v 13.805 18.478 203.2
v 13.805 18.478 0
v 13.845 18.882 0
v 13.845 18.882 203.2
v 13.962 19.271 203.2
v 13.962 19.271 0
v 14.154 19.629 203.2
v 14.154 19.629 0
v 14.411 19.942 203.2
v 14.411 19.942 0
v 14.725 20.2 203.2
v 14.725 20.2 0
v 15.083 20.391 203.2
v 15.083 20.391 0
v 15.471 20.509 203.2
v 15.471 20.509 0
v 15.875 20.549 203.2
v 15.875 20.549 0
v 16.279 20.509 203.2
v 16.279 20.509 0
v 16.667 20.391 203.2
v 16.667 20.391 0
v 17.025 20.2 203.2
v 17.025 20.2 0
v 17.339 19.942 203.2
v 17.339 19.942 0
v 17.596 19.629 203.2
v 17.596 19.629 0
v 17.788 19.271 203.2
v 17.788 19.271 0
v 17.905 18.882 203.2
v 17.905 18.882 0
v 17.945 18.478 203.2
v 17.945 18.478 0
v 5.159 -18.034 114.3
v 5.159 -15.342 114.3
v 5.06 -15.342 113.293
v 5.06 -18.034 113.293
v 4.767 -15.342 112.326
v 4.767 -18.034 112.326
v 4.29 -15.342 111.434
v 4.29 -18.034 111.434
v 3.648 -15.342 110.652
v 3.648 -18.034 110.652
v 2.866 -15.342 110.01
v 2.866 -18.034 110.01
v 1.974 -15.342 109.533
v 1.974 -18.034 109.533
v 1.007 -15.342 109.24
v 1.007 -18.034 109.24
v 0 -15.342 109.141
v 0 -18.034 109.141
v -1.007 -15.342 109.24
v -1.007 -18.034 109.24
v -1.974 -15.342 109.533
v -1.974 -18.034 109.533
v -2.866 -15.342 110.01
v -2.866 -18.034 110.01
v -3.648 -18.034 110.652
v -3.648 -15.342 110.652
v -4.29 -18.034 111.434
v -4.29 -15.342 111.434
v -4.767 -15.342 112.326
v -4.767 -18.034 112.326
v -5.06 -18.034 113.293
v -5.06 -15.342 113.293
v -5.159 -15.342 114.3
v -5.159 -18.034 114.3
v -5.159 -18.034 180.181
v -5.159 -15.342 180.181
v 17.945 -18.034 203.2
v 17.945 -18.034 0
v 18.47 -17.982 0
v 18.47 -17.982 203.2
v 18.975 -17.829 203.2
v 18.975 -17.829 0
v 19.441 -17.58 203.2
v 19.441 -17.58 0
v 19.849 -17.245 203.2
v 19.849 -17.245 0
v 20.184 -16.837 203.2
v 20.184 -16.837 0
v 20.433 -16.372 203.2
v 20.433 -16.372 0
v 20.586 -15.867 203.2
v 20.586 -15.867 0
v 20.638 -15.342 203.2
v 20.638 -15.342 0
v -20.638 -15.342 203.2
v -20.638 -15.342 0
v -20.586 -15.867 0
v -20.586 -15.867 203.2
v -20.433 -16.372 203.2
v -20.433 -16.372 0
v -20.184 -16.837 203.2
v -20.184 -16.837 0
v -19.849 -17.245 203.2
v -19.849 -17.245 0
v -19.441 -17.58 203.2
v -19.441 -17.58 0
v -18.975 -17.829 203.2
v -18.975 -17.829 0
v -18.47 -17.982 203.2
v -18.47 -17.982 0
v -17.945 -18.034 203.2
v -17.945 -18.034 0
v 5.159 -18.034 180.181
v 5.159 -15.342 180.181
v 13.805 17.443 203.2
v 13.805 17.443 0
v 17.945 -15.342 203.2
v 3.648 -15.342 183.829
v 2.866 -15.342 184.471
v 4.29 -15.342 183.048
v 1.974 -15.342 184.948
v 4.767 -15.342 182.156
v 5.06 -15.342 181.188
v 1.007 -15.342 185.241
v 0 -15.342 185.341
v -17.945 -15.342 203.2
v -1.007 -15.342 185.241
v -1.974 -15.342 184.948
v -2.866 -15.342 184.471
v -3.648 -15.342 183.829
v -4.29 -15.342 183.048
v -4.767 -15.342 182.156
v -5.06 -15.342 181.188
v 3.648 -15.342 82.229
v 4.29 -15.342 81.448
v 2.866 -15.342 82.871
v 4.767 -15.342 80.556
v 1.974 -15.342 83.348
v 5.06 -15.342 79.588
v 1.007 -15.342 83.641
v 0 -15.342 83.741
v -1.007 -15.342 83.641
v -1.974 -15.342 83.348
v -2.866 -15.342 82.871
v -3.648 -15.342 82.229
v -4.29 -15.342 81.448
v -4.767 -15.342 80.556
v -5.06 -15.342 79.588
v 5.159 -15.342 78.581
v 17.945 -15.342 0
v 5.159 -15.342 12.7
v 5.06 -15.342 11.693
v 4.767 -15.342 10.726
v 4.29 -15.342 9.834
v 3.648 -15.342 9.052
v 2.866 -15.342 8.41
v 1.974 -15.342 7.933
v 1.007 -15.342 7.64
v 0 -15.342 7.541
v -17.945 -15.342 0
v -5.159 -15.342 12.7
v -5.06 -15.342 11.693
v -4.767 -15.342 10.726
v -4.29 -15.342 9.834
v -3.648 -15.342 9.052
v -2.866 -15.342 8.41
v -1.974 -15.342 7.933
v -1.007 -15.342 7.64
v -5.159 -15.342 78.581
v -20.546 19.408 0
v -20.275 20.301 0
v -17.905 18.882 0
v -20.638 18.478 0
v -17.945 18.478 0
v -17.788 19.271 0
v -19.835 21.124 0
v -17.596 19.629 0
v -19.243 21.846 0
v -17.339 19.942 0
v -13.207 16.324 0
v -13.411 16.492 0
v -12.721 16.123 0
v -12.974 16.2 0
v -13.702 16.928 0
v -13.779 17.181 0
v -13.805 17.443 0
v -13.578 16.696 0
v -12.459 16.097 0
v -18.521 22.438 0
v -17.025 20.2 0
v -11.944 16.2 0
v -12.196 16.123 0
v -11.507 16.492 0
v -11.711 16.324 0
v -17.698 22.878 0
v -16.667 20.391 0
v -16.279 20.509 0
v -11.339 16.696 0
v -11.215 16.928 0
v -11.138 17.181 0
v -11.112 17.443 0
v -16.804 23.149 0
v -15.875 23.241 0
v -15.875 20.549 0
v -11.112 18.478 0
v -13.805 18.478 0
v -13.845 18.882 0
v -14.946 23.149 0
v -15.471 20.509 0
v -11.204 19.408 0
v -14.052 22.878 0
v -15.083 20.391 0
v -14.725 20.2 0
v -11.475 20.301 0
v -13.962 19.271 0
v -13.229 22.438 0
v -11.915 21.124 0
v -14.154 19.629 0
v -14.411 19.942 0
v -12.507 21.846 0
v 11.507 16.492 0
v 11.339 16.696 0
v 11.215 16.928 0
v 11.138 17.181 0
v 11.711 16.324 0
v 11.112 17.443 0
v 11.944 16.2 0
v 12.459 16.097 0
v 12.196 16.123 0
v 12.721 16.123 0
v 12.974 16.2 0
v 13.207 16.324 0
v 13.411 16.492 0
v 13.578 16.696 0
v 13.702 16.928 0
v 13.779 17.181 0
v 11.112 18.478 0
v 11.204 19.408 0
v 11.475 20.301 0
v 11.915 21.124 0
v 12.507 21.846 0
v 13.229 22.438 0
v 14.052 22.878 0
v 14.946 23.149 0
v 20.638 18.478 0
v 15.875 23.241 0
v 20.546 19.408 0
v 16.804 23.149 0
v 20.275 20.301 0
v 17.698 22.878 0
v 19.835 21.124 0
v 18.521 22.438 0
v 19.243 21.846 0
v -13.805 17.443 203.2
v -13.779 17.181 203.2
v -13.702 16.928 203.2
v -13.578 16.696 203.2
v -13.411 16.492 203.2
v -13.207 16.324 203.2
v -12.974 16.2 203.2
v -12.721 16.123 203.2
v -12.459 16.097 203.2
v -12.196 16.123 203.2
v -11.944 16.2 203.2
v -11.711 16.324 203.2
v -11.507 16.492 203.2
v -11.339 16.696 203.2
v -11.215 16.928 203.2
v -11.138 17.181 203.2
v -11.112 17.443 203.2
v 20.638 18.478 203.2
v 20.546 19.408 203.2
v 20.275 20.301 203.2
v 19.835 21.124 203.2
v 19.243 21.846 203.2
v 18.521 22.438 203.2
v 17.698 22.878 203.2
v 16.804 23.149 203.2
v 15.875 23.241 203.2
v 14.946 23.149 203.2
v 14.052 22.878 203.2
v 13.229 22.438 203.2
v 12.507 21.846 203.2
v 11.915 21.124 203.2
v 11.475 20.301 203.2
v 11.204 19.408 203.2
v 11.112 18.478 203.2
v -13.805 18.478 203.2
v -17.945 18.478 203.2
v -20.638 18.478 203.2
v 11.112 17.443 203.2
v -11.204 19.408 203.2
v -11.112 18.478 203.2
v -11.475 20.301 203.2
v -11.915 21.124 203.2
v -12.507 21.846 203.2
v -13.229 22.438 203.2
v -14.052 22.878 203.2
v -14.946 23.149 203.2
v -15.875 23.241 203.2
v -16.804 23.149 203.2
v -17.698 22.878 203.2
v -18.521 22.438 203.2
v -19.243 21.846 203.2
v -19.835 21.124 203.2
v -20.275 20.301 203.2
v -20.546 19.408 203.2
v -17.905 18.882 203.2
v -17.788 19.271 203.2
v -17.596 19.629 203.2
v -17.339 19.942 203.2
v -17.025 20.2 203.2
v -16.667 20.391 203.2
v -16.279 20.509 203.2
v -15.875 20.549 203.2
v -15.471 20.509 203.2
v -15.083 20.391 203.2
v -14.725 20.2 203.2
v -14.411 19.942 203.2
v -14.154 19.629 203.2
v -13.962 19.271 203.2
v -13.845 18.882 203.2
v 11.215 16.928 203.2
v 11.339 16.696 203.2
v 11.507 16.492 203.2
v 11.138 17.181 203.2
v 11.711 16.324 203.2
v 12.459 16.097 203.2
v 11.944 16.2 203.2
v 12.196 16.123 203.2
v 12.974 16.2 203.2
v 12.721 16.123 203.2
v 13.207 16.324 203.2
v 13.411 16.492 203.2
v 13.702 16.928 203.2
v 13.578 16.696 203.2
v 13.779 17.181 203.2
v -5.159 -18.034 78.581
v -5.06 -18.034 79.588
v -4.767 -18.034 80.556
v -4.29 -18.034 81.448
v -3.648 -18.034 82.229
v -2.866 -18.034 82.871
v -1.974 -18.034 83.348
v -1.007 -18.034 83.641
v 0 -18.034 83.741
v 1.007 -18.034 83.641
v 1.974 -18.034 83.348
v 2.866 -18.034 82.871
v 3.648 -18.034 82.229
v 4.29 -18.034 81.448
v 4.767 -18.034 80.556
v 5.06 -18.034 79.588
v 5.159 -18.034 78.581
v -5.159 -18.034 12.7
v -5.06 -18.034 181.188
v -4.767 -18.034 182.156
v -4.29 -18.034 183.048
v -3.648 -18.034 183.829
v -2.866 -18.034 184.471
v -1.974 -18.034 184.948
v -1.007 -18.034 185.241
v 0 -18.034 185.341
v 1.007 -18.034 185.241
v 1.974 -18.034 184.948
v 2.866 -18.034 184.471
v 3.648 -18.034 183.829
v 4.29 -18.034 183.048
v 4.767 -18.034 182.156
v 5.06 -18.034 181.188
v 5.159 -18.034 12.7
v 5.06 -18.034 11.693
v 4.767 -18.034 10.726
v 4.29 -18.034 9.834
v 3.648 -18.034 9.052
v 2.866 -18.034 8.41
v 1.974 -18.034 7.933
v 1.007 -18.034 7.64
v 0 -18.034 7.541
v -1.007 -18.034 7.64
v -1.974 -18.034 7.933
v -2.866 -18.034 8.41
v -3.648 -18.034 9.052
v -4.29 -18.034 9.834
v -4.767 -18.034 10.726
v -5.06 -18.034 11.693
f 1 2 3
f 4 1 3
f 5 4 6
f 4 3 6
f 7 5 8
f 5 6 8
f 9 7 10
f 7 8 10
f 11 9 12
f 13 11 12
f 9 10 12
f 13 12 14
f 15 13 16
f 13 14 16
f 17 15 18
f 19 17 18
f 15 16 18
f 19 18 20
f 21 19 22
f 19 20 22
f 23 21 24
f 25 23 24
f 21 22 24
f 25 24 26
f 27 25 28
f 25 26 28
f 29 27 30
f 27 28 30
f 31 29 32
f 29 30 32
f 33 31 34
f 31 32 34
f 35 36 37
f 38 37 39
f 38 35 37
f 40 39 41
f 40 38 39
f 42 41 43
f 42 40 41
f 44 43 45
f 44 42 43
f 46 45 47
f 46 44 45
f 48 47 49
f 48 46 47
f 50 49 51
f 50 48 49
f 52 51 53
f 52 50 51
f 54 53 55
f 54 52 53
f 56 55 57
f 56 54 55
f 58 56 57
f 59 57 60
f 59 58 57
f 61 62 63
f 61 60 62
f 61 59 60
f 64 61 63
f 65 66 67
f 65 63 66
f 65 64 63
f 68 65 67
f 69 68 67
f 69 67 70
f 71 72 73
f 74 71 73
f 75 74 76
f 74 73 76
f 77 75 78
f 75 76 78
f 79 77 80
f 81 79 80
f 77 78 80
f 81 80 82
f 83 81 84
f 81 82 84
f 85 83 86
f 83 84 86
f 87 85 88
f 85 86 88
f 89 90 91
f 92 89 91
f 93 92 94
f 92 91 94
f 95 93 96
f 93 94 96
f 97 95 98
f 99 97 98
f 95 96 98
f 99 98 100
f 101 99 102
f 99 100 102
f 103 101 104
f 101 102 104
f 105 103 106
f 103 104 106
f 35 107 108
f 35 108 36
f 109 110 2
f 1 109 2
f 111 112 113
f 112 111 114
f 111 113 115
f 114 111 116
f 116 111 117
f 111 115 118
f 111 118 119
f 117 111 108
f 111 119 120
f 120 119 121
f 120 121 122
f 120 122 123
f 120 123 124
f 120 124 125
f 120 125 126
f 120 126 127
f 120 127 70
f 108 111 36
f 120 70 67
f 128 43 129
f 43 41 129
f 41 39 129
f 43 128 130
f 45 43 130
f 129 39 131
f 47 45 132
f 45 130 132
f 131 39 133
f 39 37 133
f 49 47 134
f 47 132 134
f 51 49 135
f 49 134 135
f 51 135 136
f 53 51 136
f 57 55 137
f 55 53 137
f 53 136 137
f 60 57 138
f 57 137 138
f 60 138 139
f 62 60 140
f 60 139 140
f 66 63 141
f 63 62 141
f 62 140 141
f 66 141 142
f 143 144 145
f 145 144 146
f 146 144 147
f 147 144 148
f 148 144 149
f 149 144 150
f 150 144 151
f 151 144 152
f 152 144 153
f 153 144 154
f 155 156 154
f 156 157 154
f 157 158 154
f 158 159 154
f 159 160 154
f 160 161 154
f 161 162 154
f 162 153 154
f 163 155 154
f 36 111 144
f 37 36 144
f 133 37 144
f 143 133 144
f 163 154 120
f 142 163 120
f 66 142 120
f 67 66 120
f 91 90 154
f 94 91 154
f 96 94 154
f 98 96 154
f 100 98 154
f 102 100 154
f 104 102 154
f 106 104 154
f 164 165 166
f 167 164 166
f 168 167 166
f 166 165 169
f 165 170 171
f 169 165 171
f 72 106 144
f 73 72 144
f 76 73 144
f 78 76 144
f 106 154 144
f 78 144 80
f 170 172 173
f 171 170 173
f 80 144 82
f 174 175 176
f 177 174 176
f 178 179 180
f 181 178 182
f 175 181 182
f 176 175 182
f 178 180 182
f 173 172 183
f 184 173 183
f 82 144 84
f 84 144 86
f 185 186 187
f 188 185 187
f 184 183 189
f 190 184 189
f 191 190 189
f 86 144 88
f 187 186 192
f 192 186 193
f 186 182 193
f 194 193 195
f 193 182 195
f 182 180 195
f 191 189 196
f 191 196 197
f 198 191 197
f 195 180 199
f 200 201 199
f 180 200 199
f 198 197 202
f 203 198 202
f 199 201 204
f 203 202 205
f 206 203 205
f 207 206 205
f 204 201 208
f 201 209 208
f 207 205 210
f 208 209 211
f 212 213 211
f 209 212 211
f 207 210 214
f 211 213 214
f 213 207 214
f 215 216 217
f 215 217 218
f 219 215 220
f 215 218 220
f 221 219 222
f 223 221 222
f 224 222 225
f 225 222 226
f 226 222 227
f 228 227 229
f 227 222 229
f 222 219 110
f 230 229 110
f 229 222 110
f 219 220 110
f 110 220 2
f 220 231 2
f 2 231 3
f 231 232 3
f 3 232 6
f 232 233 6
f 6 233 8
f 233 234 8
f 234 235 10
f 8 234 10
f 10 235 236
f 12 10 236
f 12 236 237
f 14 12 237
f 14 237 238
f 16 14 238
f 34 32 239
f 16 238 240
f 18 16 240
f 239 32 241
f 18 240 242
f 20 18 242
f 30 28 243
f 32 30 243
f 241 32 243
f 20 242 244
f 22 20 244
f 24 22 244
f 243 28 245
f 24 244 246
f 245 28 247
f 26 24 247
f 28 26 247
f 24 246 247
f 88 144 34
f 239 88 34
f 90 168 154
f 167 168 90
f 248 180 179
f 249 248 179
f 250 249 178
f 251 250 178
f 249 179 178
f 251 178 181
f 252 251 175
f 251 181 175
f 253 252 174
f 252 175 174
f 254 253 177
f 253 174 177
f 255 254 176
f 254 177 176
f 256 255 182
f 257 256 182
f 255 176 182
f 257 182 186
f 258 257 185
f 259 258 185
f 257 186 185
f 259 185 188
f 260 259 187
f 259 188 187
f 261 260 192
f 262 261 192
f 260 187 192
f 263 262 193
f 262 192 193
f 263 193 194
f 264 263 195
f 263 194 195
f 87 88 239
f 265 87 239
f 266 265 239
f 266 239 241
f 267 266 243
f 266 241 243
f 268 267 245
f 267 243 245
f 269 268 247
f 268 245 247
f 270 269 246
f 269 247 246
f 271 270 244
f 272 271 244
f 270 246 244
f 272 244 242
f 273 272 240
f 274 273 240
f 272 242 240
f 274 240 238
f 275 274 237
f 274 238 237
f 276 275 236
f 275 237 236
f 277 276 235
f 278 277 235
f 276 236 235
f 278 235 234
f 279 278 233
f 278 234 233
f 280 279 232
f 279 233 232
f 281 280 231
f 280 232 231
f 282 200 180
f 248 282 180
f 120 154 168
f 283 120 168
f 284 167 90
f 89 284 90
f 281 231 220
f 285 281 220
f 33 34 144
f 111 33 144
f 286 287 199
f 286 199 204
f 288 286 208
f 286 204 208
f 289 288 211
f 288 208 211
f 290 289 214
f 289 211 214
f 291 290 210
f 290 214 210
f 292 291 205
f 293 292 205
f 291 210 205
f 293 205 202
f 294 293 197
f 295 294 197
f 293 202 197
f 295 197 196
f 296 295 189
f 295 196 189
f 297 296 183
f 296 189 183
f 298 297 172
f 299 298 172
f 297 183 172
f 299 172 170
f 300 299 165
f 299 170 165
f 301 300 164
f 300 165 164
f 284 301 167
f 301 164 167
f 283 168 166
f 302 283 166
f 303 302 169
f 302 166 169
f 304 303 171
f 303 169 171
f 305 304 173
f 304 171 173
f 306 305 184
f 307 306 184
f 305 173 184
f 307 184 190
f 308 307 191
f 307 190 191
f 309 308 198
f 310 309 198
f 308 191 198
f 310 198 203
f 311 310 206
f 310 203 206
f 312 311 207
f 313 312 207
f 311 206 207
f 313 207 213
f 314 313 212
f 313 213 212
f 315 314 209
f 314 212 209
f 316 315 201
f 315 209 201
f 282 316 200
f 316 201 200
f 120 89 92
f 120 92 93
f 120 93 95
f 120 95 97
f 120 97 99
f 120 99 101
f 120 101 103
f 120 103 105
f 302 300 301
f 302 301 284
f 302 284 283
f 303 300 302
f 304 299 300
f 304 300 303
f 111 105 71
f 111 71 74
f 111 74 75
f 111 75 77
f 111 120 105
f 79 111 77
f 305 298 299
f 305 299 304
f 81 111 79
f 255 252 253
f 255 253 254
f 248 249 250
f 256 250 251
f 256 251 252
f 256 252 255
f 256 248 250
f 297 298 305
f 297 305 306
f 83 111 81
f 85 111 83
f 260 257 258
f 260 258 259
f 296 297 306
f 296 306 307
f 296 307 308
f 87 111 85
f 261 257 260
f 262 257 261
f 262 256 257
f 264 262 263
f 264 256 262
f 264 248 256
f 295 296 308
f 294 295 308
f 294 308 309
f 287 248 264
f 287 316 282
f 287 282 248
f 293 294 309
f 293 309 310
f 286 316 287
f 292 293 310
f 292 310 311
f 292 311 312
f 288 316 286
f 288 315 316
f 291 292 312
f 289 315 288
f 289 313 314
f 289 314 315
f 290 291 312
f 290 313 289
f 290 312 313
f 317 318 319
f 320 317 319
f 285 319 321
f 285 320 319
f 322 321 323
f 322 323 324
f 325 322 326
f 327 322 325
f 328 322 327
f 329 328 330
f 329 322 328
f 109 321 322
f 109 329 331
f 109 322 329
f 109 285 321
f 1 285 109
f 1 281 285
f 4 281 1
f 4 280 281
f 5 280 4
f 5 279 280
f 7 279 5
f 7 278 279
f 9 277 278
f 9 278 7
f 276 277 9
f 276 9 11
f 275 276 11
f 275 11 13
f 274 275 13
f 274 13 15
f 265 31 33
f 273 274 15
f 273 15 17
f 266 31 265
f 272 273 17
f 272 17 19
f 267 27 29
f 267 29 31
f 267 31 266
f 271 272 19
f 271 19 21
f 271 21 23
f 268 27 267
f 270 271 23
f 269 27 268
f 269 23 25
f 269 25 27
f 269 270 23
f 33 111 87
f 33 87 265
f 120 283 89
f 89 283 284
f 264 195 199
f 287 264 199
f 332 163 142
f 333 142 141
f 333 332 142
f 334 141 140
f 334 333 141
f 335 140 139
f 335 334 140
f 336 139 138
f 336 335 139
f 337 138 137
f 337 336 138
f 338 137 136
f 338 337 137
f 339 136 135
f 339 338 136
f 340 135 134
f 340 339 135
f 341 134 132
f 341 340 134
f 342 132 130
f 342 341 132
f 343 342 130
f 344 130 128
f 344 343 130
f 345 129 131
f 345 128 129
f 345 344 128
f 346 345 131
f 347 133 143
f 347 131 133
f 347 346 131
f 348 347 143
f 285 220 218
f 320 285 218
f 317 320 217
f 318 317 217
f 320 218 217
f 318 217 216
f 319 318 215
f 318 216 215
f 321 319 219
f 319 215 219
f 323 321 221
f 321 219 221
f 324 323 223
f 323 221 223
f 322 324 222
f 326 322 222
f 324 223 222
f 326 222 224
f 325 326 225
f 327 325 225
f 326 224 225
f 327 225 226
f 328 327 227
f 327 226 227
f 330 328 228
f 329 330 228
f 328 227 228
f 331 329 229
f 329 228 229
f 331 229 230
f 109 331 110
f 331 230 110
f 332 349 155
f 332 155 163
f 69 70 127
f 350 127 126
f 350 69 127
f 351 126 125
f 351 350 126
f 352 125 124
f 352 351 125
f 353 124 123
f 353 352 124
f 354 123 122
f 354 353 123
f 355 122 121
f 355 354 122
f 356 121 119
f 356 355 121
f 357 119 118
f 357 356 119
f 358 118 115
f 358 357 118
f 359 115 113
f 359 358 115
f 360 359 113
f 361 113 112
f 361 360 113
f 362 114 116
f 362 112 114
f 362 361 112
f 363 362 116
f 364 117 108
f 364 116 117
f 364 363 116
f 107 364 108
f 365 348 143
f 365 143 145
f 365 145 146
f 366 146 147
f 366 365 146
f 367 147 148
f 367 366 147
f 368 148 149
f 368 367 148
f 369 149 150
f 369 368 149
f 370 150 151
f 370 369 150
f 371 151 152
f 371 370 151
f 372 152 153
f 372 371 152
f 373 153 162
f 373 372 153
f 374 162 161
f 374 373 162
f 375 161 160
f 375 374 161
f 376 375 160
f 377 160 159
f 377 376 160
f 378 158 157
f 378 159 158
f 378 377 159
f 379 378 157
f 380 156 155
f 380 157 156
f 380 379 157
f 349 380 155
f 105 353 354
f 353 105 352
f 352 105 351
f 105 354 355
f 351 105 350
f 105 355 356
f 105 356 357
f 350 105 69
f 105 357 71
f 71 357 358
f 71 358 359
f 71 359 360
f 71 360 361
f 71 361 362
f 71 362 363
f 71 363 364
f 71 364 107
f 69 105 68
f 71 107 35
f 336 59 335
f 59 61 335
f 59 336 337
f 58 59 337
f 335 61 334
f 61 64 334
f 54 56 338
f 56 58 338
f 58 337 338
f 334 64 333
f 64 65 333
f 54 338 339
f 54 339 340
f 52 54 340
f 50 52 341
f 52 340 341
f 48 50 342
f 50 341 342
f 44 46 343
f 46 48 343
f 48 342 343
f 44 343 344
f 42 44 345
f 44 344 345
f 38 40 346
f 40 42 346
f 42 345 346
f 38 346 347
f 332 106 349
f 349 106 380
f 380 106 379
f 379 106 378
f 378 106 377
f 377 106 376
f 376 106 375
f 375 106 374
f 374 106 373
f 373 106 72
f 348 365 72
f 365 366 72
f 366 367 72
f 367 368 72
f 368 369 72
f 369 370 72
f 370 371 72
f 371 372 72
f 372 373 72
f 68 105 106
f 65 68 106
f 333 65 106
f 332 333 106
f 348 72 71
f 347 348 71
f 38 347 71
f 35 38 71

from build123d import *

# Parameters (mm, degrees)
BASE_EXTRUDE_DEPTH = 203.2
LSLOT_DEPTH        = 219.410047505
LPATTERN1_COUNT    = 2
LPATTERN1_PITCH    = 101.6


with BuildPart() as part:
    # Sketch1 → Base-Extrude (new body)
    with BuildSketch(Plane.XY):
        with BuildLine():
            Line((-20.6375, 18.4785), (-20.6375, -15.3416))
            ThreePointArc((-20.6375, -15.3416), (-19.848914298, -17.245414298), (-17.9451, -18.034))
            Line((-17.9451, -18.034), (17.9451, -18.034))
            ThreePointArc((17.9451, -18.034), (19.848914298, -17.245414298), (20.6375, -15.3416))
            Line((20.6375, -15.3416), (20.6375, 18.4785))
            ThreePointArc((20.6375, 18.4785), (15.875, 23.241), (11.1125, 18.4785))
            Line((11.1125, 18.4785), (11.1125, 17.44345))
            ThreePointArc((11.1125, 17.44345), (12.4587, 16.09725), (13.8049, 17.44345))
            Line((13.8049, 17.44345), (13.8049, 18.4785))
            ThreePointArc((13.8049, 18.4785), (15.875, 20.5486), (17.9451, 18.4785))
            Line((17.9451, 18.4785), (17.9451, -15.3416))
            Line((17.9451, -15.3416), (-17.9451, -15.3416))
            Line((-17.9451, -15.3416), (-17.9451, 18.4785))
            ThreePointArc((-17.9451, 18.4785), (-15.875, 20.5486), (-13.8049, 18.4785))
            Line((-13.8049, 18.4785), (-13.8049, 17.44345))
            ThreePointArc((-13.8049, 17.44345), (-12.4587, 16.09725), (-11.1125, 17.44345))
            Line((-11.1125, 17.44345), (-11.1125, 18.4785))
            ThreePointArc((-11.1125, 18.4785), (-15.875, 23.241), (-20.6375, 18.4785))
        make_face()
    extrude(amount=BASE_EXTRUDE_DEPTH)

    # Sketch2 → LSlot (cut, through all)
    with BuildSketch(Plane(origin=(1.308314937, -18.034, -10.148785872), x_dir=(1, 0, 0), z_dir=(0, -1, 0))):
        with BuildLine():
            Line((3.851060063, 88.730035872), (3.851060063, 22.848785872))
            ThreePointArc((3.851060063, 22.848785872), (-1.308314937, 17.689410872), (-6.467689937, 22.848785872))
            Line((-6.467689937, 22.848785872), (-6.467689937, 88.730035872))
            ThreePointArc((-6.467689937, 88.730035872), (-1.308314937, 93.889410872), (3.851060063, 88.730035872))
        make_face()
    lslot = extrude(amount=-LSLOT_DEPTH, mode=Mode.SUBTRACT)

    # LPattern1: LSlot ×2
    with Locations(*[(0, 0, i * LPATTERN1_PITCH) for i in range(1, LPATTERN1_COUNT)]):
        add(lslot, mode=Mode.SUBTRACT)


solid = part.part
